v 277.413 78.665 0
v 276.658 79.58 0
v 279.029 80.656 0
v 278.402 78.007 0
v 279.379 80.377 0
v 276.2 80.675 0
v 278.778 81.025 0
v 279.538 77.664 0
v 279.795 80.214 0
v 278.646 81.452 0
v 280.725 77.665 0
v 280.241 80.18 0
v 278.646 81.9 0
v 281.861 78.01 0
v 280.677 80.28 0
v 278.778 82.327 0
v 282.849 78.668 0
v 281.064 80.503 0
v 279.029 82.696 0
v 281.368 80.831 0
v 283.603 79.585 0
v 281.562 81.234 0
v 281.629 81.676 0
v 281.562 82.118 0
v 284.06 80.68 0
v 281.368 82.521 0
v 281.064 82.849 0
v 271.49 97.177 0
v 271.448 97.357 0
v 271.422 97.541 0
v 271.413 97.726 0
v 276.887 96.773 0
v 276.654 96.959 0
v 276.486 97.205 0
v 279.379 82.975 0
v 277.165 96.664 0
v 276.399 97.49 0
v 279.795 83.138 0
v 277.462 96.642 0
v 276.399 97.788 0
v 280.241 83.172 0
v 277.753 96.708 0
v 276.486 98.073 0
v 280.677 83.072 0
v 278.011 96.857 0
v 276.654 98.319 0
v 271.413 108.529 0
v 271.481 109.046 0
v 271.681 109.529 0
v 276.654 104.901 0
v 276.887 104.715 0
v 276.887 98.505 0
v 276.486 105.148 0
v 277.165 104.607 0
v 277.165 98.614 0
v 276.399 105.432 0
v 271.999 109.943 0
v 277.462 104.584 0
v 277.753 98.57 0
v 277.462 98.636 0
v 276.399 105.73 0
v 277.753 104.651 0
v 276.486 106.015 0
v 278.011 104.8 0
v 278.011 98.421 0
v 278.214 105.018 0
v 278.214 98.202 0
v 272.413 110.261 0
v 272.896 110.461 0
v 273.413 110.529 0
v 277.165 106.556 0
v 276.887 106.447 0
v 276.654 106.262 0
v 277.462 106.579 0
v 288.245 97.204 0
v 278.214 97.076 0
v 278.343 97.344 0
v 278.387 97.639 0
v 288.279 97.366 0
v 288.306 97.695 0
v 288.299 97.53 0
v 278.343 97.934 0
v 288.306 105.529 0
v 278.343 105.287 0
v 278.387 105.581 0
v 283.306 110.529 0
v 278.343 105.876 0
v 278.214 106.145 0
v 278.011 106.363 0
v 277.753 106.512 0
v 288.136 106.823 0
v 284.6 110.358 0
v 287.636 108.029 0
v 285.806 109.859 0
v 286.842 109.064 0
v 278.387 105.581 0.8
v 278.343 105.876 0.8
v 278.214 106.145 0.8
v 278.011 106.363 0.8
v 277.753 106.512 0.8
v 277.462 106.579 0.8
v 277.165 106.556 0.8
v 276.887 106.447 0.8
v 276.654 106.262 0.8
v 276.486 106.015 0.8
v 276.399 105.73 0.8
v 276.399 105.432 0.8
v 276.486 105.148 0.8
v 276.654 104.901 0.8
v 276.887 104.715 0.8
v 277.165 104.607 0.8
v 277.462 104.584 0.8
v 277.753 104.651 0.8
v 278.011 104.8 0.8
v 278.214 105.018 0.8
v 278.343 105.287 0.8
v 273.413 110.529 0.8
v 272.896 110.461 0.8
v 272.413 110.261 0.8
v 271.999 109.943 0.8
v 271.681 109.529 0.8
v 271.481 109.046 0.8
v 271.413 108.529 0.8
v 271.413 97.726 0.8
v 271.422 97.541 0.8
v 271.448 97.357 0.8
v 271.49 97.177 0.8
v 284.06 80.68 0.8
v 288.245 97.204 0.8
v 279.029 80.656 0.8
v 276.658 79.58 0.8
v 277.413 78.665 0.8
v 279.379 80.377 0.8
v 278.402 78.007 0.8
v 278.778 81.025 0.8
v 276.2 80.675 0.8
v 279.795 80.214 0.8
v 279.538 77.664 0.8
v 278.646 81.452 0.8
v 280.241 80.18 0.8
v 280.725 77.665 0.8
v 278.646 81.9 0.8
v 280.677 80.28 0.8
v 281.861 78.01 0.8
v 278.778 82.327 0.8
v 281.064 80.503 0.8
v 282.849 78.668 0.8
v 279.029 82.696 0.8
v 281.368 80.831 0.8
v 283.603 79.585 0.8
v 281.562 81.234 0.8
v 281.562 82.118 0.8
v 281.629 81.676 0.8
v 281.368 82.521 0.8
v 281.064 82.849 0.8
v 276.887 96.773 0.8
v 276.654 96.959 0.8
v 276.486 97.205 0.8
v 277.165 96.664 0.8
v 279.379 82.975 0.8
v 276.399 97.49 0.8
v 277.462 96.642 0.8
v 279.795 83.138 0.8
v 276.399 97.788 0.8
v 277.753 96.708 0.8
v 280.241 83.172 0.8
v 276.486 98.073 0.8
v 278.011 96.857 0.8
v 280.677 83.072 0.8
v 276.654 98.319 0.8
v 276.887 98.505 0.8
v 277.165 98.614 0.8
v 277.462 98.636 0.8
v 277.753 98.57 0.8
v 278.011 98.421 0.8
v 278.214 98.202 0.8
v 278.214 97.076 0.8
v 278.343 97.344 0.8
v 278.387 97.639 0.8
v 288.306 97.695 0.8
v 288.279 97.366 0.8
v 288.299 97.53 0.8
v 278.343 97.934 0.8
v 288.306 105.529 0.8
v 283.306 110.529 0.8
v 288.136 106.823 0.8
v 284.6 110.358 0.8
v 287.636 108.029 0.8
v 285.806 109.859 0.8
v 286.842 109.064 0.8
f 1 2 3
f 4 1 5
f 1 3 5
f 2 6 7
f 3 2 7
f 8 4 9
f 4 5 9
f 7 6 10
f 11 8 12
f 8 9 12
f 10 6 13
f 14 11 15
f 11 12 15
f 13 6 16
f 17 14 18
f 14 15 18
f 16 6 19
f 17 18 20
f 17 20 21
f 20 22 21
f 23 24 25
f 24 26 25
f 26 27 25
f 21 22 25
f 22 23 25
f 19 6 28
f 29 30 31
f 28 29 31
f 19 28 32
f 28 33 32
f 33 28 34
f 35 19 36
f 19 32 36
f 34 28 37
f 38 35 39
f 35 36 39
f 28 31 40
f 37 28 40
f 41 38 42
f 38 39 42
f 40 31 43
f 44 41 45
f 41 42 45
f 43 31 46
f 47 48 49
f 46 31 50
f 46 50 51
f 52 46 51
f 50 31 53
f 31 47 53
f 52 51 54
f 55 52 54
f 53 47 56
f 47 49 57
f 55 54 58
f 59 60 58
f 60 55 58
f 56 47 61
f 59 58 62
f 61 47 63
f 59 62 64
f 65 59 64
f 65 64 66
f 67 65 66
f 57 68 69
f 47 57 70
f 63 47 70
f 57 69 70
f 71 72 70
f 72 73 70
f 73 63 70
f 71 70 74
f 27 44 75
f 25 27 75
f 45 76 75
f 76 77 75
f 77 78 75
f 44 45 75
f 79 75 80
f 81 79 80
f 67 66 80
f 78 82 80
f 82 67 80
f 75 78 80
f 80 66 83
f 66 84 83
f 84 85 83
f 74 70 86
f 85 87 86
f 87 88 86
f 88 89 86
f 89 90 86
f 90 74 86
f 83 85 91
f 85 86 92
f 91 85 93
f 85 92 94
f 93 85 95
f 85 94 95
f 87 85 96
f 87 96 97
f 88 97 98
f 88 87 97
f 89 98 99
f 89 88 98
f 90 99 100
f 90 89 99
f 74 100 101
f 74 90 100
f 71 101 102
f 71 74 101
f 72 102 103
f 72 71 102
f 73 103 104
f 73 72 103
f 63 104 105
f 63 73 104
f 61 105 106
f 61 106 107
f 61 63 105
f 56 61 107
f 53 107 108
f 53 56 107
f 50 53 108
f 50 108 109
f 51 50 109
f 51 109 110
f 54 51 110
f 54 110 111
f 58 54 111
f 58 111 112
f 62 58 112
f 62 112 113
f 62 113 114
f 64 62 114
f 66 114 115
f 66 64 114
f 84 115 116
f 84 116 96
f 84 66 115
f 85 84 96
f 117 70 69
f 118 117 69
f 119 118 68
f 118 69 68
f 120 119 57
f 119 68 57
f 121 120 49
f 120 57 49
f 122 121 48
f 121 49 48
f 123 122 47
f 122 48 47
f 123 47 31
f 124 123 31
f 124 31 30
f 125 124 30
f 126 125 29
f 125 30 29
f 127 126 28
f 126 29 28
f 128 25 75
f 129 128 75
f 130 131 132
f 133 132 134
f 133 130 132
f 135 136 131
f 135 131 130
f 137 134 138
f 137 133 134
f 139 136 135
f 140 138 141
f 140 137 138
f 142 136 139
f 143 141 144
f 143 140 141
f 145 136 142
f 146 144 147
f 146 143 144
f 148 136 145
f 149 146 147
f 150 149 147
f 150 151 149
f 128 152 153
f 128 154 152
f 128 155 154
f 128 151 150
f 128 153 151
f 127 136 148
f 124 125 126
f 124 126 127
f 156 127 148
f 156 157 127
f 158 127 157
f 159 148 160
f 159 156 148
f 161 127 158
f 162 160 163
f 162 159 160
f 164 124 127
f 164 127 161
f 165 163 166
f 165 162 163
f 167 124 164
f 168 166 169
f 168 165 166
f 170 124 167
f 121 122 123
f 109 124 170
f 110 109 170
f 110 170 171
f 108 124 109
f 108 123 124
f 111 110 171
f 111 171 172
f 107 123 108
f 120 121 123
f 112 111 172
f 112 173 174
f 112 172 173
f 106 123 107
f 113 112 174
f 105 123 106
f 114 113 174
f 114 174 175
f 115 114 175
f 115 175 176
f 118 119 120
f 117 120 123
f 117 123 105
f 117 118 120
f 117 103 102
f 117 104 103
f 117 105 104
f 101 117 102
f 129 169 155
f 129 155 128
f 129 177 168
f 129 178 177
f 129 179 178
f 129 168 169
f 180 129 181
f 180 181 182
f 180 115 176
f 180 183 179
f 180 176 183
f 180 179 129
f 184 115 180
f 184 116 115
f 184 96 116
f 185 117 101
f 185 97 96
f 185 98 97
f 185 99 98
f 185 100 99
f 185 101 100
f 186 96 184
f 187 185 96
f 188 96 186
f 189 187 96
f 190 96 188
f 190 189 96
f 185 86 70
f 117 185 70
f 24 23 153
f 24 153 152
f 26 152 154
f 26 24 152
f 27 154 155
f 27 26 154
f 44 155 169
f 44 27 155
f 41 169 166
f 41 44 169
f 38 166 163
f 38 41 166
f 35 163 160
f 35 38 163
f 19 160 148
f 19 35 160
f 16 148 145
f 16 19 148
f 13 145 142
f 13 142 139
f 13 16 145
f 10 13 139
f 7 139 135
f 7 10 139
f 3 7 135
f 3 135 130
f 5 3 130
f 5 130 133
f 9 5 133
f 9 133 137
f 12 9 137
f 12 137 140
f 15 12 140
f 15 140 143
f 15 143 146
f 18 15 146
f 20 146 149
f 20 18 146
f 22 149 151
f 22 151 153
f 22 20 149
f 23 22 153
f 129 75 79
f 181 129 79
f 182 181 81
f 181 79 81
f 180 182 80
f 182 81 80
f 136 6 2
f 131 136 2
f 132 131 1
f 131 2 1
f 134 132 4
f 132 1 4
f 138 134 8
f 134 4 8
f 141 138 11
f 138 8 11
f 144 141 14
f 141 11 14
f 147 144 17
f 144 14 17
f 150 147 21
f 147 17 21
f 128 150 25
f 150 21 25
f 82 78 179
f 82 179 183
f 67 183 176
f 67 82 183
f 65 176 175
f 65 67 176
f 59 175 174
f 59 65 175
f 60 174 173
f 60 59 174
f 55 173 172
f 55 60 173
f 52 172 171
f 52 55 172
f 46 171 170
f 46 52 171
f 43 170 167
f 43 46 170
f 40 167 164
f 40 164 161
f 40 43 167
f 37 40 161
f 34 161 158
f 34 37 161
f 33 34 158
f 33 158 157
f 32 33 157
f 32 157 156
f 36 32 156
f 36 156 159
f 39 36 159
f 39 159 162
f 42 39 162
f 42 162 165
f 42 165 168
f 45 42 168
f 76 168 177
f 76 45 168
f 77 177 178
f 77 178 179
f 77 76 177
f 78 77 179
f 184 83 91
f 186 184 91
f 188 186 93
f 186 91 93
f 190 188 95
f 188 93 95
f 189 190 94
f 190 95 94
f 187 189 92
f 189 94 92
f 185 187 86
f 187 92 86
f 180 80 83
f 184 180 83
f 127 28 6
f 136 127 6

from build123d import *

# Parameters (mm, degrees)
SKETCH1_R           = 1.5
SKETCH1_R_2         = 1
BOSS_EXTRUDE1_DEPTH = 0.8


with BuildPart() as part:
    # Sketch1 → Boss-Extrude1 (new body)
    with BuildSketch(Plane.XY):
        with BuildLine():
            Line((271.490097916, 97.17699679), (276.199648247, 80.675234569))
            ThreePointArc((276.199648247, 80.675234569), (280.131732963, 77.621186661), (284.059750771, 80.680463526))
            Line((284.059750771, 80.680463526), (288.244841789, 97.204357374))
            ThreePointArc((288.244841789, 97.204357374), (288.290696471, 97.447979301), (288.306060045, 97.695402532))
            Line((288.306060045, 97.695402532), (288.306060045, 105.52876871))
            ThreePointArc((288.306060045, 105.52876871), (286.84159395, 109.064302616), (283.306060045, 110.52876871))
            Line((283.306060045, 110.52876871), (273.41330701, 110.52876871))
            ThreePointArc((273.41330701, 110.52876871), (271.999093448, 109.942982273), (271.41330701, 108.52876871))
            Line((271.41330701, 108.52876871), (271.41330701, 97.725874534))
            ThreePointArc((271.41330701, 97.725874534), (271.43259777, 97.448762814), (271.490097916, 97.17699679))
        make_face()
        with Locations((280.129035475, 81.676015872)):
            Circle(SKETCH1_R, mode=Mode.SUBTRACT)
        with Locations((277.387391499, 105.581442102)):
            Circle(SKETCH1_R_2, mode=Mode.SUBTRACT)
        with Locations((277.387391499, 97.638982501)):
            Circle(SKETCH1_R_2, mode=Mode.SUBTRACT)
    extrude(amount=BOSS_EXTRUDE1_DEPTH)


solid = part.part
